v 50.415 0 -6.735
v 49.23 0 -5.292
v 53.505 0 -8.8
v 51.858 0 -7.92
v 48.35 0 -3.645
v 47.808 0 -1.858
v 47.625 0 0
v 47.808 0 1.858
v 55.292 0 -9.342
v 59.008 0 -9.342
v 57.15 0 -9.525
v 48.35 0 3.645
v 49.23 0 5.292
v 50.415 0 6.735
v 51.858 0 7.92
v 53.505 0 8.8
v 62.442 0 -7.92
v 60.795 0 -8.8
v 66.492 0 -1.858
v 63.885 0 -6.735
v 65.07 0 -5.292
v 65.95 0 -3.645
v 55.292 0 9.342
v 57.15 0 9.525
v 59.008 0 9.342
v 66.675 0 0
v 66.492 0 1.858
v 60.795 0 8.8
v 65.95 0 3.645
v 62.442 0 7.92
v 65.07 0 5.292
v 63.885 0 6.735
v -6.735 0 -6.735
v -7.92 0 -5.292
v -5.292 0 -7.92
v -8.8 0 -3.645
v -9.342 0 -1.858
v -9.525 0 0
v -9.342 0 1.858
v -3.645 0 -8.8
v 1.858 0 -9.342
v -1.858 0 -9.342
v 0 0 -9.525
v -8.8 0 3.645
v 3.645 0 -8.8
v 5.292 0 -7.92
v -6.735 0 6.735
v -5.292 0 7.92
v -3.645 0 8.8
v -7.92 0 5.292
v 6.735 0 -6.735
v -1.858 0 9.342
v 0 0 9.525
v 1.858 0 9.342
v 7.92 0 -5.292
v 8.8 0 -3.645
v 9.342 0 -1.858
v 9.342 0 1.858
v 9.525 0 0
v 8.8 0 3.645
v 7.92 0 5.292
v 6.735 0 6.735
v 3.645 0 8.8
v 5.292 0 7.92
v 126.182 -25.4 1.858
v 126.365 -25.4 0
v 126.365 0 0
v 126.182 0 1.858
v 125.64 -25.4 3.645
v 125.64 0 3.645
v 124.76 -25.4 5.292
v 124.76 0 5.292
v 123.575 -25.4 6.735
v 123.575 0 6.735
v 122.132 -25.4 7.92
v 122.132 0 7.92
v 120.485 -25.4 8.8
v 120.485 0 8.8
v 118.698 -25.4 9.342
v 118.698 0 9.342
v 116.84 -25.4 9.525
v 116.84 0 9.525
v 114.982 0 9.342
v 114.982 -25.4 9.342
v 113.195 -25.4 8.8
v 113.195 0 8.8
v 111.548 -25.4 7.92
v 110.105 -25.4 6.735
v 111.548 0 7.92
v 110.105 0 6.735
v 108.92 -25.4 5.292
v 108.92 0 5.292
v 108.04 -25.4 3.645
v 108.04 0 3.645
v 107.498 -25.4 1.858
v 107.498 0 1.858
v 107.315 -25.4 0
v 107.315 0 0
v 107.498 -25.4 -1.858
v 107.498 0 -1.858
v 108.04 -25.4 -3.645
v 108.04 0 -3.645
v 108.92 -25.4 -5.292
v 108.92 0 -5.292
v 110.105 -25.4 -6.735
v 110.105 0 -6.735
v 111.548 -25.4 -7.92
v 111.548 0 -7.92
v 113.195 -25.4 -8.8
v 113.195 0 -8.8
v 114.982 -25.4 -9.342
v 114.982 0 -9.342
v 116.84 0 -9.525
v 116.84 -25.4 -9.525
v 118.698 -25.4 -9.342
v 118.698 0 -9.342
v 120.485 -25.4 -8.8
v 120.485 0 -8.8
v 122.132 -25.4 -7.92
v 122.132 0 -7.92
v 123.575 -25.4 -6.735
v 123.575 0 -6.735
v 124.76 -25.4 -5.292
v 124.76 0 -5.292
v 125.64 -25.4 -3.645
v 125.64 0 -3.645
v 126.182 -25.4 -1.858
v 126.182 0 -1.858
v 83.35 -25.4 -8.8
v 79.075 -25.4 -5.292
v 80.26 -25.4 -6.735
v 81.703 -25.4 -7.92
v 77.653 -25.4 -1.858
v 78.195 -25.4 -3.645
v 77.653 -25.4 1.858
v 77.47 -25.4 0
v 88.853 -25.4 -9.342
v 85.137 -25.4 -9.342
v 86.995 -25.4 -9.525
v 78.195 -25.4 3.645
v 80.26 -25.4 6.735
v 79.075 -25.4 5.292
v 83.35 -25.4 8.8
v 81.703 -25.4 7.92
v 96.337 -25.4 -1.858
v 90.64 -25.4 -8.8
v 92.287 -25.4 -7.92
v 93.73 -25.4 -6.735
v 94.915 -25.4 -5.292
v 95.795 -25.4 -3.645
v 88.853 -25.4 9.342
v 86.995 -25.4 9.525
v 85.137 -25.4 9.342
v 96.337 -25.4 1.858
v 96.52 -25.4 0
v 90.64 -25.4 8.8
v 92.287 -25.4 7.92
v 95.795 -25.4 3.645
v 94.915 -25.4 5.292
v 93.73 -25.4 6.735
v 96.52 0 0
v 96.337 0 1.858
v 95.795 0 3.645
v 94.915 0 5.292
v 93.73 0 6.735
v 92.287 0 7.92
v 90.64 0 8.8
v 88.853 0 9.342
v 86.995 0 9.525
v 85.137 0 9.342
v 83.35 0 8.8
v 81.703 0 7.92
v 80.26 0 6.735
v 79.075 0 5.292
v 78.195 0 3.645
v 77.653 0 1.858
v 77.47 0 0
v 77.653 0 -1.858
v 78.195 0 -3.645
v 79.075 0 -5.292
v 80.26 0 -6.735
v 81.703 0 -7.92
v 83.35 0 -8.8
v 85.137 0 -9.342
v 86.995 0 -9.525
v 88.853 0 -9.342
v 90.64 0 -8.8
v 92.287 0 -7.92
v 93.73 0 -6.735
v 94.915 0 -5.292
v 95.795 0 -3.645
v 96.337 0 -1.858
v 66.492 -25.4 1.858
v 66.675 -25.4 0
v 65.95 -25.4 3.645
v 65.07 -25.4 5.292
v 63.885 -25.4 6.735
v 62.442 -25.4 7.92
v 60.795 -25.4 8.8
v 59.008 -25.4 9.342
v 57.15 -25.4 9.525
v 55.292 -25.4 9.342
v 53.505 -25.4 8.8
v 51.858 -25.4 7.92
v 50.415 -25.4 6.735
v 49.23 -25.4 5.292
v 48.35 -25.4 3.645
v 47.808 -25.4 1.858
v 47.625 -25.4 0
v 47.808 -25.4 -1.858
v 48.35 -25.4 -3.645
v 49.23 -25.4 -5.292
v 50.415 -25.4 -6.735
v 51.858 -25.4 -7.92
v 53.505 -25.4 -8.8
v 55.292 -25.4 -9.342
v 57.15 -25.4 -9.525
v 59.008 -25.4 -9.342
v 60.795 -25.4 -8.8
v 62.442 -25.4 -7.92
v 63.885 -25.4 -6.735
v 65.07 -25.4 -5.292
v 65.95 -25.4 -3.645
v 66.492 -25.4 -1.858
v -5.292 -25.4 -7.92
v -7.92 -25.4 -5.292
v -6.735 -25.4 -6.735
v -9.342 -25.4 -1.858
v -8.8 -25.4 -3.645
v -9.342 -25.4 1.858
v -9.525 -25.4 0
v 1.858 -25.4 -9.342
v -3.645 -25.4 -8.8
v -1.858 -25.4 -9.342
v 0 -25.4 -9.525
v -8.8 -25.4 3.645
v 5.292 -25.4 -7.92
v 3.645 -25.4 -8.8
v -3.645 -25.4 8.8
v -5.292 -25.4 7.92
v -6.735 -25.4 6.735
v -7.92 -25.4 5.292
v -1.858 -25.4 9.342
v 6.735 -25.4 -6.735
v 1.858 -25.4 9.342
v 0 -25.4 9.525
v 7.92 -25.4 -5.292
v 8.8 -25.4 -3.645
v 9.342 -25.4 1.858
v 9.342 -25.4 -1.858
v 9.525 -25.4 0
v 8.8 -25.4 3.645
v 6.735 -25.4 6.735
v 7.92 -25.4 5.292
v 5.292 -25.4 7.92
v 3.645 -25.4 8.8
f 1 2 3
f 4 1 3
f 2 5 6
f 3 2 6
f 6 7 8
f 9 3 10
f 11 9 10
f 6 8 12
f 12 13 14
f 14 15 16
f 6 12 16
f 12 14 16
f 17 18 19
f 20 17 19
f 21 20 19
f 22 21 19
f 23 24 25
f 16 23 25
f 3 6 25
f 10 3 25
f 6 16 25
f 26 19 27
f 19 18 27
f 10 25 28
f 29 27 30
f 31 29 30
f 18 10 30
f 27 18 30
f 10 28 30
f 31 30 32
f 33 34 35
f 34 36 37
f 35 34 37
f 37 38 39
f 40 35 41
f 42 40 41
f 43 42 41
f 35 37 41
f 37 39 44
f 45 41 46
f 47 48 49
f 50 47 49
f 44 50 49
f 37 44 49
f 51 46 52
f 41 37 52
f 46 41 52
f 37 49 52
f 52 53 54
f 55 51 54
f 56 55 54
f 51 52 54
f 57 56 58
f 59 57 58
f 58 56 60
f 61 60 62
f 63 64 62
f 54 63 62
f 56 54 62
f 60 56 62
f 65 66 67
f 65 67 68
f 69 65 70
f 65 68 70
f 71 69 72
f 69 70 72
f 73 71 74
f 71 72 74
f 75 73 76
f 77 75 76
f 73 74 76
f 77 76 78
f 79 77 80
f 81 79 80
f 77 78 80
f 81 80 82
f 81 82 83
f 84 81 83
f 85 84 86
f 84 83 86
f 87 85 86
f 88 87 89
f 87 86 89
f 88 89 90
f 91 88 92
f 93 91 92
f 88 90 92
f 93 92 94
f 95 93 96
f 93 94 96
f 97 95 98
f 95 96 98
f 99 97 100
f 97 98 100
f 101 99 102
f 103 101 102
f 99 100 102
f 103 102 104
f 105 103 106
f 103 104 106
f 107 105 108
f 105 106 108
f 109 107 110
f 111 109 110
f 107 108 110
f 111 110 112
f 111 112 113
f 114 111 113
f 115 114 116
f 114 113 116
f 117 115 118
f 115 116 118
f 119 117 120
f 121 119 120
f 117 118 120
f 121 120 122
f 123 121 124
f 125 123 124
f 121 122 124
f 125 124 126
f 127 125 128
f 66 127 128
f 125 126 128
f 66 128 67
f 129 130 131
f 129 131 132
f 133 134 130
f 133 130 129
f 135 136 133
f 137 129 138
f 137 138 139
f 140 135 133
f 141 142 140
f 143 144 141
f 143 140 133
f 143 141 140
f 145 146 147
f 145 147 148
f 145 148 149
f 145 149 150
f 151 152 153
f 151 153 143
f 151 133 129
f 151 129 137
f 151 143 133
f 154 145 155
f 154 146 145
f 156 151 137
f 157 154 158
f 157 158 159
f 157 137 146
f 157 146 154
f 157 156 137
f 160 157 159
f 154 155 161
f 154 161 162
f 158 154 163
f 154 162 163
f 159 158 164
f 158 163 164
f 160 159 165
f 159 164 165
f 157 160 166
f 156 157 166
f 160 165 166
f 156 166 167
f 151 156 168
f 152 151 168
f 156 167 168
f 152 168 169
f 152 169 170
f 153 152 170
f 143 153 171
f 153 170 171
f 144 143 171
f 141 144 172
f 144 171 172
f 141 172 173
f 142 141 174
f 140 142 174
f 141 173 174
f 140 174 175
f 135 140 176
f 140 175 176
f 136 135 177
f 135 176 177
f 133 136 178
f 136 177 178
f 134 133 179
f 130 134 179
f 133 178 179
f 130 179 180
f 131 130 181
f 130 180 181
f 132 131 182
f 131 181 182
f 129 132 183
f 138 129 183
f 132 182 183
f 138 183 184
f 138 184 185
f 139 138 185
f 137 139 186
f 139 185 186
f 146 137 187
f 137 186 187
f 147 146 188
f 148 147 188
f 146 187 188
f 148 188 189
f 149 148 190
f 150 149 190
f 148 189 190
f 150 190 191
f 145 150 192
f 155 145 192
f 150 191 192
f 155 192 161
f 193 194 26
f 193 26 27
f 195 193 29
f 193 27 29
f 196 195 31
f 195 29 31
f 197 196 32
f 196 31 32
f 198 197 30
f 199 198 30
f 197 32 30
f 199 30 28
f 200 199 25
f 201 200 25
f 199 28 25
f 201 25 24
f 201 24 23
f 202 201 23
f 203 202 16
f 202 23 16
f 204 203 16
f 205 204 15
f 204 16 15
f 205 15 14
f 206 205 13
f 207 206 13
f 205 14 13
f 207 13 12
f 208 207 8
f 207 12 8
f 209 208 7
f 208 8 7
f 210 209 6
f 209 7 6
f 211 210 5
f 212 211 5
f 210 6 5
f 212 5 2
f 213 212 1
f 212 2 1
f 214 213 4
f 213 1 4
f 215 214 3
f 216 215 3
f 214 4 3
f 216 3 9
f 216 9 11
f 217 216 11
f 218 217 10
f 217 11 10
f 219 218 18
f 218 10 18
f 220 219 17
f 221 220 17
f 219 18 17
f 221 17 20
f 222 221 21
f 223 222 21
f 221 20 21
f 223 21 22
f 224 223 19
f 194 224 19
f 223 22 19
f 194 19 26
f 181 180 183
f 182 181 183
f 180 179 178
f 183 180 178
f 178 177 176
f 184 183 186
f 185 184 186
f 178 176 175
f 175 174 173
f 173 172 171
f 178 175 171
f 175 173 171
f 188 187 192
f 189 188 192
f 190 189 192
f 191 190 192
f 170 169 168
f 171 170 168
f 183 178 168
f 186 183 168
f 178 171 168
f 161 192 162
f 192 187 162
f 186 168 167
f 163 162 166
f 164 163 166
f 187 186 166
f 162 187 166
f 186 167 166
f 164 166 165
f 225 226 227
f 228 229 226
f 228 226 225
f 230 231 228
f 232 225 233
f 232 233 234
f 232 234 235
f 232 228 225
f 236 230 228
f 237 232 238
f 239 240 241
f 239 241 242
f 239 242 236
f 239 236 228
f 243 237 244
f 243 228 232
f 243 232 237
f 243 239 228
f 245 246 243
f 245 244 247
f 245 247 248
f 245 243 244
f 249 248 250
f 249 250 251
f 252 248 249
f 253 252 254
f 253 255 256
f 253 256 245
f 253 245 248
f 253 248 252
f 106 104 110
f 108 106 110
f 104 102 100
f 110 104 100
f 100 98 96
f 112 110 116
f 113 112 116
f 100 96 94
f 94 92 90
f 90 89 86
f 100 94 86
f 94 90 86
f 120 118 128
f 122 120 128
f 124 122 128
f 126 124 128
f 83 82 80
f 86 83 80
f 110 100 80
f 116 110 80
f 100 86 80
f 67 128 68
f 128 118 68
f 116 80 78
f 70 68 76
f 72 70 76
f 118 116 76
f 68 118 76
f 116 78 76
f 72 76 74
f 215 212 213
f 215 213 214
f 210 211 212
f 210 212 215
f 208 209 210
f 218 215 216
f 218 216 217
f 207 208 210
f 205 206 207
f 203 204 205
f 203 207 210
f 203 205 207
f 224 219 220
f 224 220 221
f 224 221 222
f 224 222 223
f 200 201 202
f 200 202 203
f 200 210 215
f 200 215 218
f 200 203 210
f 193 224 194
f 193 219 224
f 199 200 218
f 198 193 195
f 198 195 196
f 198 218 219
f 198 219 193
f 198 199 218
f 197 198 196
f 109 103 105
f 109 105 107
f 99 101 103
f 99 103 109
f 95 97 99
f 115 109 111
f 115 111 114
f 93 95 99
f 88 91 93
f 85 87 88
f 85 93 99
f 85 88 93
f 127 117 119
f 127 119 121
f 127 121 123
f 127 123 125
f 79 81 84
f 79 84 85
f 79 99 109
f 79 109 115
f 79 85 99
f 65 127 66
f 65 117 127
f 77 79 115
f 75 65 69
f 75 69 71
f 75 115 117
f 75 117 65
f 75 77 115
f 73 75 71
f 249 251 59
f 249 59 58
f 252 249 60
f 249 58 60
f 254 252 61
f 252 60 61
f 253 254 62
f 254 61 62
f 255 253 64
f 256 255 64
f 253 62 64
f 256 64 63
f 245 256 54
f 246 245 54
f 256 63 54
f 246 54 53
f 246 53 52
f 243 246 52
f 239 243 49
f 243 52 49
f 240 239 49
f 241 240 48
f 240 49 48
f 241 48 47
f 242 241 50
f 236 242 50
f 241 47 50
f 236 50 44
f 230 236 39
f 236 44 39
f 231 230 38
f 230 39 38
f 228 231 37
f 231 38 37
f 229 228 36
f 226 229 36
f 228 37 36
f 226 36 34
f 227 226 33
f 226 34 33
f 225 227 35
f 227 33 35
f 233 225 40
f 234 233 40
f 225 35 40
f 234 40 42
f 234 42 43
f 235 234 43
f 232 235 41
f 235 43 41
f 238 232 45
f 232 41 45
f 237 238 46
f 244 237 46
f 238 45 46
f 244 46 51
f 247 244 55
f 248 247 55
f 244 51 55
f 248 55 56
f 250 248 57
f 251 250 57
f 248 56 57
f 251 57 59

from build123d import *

# Parameters (mm, degrees)
F0_R     = 9.525
F1_DEPTH = 25.4


with BuildPart() as f1:
    # F0 (on Front) → F1 (new body)
    with BuildSketch(Plane.XZ):
        with Locations((86.995, 0)):
            Circle(F0_R)
        with Locations((116.84, 0)):
            Circle(F0_R)
        with Locations((57.15, 0)):
            Circle(F0_R)
        Circle(F0_R)
    extrude(amount=F1_DEPTH)


solid = f1.part
